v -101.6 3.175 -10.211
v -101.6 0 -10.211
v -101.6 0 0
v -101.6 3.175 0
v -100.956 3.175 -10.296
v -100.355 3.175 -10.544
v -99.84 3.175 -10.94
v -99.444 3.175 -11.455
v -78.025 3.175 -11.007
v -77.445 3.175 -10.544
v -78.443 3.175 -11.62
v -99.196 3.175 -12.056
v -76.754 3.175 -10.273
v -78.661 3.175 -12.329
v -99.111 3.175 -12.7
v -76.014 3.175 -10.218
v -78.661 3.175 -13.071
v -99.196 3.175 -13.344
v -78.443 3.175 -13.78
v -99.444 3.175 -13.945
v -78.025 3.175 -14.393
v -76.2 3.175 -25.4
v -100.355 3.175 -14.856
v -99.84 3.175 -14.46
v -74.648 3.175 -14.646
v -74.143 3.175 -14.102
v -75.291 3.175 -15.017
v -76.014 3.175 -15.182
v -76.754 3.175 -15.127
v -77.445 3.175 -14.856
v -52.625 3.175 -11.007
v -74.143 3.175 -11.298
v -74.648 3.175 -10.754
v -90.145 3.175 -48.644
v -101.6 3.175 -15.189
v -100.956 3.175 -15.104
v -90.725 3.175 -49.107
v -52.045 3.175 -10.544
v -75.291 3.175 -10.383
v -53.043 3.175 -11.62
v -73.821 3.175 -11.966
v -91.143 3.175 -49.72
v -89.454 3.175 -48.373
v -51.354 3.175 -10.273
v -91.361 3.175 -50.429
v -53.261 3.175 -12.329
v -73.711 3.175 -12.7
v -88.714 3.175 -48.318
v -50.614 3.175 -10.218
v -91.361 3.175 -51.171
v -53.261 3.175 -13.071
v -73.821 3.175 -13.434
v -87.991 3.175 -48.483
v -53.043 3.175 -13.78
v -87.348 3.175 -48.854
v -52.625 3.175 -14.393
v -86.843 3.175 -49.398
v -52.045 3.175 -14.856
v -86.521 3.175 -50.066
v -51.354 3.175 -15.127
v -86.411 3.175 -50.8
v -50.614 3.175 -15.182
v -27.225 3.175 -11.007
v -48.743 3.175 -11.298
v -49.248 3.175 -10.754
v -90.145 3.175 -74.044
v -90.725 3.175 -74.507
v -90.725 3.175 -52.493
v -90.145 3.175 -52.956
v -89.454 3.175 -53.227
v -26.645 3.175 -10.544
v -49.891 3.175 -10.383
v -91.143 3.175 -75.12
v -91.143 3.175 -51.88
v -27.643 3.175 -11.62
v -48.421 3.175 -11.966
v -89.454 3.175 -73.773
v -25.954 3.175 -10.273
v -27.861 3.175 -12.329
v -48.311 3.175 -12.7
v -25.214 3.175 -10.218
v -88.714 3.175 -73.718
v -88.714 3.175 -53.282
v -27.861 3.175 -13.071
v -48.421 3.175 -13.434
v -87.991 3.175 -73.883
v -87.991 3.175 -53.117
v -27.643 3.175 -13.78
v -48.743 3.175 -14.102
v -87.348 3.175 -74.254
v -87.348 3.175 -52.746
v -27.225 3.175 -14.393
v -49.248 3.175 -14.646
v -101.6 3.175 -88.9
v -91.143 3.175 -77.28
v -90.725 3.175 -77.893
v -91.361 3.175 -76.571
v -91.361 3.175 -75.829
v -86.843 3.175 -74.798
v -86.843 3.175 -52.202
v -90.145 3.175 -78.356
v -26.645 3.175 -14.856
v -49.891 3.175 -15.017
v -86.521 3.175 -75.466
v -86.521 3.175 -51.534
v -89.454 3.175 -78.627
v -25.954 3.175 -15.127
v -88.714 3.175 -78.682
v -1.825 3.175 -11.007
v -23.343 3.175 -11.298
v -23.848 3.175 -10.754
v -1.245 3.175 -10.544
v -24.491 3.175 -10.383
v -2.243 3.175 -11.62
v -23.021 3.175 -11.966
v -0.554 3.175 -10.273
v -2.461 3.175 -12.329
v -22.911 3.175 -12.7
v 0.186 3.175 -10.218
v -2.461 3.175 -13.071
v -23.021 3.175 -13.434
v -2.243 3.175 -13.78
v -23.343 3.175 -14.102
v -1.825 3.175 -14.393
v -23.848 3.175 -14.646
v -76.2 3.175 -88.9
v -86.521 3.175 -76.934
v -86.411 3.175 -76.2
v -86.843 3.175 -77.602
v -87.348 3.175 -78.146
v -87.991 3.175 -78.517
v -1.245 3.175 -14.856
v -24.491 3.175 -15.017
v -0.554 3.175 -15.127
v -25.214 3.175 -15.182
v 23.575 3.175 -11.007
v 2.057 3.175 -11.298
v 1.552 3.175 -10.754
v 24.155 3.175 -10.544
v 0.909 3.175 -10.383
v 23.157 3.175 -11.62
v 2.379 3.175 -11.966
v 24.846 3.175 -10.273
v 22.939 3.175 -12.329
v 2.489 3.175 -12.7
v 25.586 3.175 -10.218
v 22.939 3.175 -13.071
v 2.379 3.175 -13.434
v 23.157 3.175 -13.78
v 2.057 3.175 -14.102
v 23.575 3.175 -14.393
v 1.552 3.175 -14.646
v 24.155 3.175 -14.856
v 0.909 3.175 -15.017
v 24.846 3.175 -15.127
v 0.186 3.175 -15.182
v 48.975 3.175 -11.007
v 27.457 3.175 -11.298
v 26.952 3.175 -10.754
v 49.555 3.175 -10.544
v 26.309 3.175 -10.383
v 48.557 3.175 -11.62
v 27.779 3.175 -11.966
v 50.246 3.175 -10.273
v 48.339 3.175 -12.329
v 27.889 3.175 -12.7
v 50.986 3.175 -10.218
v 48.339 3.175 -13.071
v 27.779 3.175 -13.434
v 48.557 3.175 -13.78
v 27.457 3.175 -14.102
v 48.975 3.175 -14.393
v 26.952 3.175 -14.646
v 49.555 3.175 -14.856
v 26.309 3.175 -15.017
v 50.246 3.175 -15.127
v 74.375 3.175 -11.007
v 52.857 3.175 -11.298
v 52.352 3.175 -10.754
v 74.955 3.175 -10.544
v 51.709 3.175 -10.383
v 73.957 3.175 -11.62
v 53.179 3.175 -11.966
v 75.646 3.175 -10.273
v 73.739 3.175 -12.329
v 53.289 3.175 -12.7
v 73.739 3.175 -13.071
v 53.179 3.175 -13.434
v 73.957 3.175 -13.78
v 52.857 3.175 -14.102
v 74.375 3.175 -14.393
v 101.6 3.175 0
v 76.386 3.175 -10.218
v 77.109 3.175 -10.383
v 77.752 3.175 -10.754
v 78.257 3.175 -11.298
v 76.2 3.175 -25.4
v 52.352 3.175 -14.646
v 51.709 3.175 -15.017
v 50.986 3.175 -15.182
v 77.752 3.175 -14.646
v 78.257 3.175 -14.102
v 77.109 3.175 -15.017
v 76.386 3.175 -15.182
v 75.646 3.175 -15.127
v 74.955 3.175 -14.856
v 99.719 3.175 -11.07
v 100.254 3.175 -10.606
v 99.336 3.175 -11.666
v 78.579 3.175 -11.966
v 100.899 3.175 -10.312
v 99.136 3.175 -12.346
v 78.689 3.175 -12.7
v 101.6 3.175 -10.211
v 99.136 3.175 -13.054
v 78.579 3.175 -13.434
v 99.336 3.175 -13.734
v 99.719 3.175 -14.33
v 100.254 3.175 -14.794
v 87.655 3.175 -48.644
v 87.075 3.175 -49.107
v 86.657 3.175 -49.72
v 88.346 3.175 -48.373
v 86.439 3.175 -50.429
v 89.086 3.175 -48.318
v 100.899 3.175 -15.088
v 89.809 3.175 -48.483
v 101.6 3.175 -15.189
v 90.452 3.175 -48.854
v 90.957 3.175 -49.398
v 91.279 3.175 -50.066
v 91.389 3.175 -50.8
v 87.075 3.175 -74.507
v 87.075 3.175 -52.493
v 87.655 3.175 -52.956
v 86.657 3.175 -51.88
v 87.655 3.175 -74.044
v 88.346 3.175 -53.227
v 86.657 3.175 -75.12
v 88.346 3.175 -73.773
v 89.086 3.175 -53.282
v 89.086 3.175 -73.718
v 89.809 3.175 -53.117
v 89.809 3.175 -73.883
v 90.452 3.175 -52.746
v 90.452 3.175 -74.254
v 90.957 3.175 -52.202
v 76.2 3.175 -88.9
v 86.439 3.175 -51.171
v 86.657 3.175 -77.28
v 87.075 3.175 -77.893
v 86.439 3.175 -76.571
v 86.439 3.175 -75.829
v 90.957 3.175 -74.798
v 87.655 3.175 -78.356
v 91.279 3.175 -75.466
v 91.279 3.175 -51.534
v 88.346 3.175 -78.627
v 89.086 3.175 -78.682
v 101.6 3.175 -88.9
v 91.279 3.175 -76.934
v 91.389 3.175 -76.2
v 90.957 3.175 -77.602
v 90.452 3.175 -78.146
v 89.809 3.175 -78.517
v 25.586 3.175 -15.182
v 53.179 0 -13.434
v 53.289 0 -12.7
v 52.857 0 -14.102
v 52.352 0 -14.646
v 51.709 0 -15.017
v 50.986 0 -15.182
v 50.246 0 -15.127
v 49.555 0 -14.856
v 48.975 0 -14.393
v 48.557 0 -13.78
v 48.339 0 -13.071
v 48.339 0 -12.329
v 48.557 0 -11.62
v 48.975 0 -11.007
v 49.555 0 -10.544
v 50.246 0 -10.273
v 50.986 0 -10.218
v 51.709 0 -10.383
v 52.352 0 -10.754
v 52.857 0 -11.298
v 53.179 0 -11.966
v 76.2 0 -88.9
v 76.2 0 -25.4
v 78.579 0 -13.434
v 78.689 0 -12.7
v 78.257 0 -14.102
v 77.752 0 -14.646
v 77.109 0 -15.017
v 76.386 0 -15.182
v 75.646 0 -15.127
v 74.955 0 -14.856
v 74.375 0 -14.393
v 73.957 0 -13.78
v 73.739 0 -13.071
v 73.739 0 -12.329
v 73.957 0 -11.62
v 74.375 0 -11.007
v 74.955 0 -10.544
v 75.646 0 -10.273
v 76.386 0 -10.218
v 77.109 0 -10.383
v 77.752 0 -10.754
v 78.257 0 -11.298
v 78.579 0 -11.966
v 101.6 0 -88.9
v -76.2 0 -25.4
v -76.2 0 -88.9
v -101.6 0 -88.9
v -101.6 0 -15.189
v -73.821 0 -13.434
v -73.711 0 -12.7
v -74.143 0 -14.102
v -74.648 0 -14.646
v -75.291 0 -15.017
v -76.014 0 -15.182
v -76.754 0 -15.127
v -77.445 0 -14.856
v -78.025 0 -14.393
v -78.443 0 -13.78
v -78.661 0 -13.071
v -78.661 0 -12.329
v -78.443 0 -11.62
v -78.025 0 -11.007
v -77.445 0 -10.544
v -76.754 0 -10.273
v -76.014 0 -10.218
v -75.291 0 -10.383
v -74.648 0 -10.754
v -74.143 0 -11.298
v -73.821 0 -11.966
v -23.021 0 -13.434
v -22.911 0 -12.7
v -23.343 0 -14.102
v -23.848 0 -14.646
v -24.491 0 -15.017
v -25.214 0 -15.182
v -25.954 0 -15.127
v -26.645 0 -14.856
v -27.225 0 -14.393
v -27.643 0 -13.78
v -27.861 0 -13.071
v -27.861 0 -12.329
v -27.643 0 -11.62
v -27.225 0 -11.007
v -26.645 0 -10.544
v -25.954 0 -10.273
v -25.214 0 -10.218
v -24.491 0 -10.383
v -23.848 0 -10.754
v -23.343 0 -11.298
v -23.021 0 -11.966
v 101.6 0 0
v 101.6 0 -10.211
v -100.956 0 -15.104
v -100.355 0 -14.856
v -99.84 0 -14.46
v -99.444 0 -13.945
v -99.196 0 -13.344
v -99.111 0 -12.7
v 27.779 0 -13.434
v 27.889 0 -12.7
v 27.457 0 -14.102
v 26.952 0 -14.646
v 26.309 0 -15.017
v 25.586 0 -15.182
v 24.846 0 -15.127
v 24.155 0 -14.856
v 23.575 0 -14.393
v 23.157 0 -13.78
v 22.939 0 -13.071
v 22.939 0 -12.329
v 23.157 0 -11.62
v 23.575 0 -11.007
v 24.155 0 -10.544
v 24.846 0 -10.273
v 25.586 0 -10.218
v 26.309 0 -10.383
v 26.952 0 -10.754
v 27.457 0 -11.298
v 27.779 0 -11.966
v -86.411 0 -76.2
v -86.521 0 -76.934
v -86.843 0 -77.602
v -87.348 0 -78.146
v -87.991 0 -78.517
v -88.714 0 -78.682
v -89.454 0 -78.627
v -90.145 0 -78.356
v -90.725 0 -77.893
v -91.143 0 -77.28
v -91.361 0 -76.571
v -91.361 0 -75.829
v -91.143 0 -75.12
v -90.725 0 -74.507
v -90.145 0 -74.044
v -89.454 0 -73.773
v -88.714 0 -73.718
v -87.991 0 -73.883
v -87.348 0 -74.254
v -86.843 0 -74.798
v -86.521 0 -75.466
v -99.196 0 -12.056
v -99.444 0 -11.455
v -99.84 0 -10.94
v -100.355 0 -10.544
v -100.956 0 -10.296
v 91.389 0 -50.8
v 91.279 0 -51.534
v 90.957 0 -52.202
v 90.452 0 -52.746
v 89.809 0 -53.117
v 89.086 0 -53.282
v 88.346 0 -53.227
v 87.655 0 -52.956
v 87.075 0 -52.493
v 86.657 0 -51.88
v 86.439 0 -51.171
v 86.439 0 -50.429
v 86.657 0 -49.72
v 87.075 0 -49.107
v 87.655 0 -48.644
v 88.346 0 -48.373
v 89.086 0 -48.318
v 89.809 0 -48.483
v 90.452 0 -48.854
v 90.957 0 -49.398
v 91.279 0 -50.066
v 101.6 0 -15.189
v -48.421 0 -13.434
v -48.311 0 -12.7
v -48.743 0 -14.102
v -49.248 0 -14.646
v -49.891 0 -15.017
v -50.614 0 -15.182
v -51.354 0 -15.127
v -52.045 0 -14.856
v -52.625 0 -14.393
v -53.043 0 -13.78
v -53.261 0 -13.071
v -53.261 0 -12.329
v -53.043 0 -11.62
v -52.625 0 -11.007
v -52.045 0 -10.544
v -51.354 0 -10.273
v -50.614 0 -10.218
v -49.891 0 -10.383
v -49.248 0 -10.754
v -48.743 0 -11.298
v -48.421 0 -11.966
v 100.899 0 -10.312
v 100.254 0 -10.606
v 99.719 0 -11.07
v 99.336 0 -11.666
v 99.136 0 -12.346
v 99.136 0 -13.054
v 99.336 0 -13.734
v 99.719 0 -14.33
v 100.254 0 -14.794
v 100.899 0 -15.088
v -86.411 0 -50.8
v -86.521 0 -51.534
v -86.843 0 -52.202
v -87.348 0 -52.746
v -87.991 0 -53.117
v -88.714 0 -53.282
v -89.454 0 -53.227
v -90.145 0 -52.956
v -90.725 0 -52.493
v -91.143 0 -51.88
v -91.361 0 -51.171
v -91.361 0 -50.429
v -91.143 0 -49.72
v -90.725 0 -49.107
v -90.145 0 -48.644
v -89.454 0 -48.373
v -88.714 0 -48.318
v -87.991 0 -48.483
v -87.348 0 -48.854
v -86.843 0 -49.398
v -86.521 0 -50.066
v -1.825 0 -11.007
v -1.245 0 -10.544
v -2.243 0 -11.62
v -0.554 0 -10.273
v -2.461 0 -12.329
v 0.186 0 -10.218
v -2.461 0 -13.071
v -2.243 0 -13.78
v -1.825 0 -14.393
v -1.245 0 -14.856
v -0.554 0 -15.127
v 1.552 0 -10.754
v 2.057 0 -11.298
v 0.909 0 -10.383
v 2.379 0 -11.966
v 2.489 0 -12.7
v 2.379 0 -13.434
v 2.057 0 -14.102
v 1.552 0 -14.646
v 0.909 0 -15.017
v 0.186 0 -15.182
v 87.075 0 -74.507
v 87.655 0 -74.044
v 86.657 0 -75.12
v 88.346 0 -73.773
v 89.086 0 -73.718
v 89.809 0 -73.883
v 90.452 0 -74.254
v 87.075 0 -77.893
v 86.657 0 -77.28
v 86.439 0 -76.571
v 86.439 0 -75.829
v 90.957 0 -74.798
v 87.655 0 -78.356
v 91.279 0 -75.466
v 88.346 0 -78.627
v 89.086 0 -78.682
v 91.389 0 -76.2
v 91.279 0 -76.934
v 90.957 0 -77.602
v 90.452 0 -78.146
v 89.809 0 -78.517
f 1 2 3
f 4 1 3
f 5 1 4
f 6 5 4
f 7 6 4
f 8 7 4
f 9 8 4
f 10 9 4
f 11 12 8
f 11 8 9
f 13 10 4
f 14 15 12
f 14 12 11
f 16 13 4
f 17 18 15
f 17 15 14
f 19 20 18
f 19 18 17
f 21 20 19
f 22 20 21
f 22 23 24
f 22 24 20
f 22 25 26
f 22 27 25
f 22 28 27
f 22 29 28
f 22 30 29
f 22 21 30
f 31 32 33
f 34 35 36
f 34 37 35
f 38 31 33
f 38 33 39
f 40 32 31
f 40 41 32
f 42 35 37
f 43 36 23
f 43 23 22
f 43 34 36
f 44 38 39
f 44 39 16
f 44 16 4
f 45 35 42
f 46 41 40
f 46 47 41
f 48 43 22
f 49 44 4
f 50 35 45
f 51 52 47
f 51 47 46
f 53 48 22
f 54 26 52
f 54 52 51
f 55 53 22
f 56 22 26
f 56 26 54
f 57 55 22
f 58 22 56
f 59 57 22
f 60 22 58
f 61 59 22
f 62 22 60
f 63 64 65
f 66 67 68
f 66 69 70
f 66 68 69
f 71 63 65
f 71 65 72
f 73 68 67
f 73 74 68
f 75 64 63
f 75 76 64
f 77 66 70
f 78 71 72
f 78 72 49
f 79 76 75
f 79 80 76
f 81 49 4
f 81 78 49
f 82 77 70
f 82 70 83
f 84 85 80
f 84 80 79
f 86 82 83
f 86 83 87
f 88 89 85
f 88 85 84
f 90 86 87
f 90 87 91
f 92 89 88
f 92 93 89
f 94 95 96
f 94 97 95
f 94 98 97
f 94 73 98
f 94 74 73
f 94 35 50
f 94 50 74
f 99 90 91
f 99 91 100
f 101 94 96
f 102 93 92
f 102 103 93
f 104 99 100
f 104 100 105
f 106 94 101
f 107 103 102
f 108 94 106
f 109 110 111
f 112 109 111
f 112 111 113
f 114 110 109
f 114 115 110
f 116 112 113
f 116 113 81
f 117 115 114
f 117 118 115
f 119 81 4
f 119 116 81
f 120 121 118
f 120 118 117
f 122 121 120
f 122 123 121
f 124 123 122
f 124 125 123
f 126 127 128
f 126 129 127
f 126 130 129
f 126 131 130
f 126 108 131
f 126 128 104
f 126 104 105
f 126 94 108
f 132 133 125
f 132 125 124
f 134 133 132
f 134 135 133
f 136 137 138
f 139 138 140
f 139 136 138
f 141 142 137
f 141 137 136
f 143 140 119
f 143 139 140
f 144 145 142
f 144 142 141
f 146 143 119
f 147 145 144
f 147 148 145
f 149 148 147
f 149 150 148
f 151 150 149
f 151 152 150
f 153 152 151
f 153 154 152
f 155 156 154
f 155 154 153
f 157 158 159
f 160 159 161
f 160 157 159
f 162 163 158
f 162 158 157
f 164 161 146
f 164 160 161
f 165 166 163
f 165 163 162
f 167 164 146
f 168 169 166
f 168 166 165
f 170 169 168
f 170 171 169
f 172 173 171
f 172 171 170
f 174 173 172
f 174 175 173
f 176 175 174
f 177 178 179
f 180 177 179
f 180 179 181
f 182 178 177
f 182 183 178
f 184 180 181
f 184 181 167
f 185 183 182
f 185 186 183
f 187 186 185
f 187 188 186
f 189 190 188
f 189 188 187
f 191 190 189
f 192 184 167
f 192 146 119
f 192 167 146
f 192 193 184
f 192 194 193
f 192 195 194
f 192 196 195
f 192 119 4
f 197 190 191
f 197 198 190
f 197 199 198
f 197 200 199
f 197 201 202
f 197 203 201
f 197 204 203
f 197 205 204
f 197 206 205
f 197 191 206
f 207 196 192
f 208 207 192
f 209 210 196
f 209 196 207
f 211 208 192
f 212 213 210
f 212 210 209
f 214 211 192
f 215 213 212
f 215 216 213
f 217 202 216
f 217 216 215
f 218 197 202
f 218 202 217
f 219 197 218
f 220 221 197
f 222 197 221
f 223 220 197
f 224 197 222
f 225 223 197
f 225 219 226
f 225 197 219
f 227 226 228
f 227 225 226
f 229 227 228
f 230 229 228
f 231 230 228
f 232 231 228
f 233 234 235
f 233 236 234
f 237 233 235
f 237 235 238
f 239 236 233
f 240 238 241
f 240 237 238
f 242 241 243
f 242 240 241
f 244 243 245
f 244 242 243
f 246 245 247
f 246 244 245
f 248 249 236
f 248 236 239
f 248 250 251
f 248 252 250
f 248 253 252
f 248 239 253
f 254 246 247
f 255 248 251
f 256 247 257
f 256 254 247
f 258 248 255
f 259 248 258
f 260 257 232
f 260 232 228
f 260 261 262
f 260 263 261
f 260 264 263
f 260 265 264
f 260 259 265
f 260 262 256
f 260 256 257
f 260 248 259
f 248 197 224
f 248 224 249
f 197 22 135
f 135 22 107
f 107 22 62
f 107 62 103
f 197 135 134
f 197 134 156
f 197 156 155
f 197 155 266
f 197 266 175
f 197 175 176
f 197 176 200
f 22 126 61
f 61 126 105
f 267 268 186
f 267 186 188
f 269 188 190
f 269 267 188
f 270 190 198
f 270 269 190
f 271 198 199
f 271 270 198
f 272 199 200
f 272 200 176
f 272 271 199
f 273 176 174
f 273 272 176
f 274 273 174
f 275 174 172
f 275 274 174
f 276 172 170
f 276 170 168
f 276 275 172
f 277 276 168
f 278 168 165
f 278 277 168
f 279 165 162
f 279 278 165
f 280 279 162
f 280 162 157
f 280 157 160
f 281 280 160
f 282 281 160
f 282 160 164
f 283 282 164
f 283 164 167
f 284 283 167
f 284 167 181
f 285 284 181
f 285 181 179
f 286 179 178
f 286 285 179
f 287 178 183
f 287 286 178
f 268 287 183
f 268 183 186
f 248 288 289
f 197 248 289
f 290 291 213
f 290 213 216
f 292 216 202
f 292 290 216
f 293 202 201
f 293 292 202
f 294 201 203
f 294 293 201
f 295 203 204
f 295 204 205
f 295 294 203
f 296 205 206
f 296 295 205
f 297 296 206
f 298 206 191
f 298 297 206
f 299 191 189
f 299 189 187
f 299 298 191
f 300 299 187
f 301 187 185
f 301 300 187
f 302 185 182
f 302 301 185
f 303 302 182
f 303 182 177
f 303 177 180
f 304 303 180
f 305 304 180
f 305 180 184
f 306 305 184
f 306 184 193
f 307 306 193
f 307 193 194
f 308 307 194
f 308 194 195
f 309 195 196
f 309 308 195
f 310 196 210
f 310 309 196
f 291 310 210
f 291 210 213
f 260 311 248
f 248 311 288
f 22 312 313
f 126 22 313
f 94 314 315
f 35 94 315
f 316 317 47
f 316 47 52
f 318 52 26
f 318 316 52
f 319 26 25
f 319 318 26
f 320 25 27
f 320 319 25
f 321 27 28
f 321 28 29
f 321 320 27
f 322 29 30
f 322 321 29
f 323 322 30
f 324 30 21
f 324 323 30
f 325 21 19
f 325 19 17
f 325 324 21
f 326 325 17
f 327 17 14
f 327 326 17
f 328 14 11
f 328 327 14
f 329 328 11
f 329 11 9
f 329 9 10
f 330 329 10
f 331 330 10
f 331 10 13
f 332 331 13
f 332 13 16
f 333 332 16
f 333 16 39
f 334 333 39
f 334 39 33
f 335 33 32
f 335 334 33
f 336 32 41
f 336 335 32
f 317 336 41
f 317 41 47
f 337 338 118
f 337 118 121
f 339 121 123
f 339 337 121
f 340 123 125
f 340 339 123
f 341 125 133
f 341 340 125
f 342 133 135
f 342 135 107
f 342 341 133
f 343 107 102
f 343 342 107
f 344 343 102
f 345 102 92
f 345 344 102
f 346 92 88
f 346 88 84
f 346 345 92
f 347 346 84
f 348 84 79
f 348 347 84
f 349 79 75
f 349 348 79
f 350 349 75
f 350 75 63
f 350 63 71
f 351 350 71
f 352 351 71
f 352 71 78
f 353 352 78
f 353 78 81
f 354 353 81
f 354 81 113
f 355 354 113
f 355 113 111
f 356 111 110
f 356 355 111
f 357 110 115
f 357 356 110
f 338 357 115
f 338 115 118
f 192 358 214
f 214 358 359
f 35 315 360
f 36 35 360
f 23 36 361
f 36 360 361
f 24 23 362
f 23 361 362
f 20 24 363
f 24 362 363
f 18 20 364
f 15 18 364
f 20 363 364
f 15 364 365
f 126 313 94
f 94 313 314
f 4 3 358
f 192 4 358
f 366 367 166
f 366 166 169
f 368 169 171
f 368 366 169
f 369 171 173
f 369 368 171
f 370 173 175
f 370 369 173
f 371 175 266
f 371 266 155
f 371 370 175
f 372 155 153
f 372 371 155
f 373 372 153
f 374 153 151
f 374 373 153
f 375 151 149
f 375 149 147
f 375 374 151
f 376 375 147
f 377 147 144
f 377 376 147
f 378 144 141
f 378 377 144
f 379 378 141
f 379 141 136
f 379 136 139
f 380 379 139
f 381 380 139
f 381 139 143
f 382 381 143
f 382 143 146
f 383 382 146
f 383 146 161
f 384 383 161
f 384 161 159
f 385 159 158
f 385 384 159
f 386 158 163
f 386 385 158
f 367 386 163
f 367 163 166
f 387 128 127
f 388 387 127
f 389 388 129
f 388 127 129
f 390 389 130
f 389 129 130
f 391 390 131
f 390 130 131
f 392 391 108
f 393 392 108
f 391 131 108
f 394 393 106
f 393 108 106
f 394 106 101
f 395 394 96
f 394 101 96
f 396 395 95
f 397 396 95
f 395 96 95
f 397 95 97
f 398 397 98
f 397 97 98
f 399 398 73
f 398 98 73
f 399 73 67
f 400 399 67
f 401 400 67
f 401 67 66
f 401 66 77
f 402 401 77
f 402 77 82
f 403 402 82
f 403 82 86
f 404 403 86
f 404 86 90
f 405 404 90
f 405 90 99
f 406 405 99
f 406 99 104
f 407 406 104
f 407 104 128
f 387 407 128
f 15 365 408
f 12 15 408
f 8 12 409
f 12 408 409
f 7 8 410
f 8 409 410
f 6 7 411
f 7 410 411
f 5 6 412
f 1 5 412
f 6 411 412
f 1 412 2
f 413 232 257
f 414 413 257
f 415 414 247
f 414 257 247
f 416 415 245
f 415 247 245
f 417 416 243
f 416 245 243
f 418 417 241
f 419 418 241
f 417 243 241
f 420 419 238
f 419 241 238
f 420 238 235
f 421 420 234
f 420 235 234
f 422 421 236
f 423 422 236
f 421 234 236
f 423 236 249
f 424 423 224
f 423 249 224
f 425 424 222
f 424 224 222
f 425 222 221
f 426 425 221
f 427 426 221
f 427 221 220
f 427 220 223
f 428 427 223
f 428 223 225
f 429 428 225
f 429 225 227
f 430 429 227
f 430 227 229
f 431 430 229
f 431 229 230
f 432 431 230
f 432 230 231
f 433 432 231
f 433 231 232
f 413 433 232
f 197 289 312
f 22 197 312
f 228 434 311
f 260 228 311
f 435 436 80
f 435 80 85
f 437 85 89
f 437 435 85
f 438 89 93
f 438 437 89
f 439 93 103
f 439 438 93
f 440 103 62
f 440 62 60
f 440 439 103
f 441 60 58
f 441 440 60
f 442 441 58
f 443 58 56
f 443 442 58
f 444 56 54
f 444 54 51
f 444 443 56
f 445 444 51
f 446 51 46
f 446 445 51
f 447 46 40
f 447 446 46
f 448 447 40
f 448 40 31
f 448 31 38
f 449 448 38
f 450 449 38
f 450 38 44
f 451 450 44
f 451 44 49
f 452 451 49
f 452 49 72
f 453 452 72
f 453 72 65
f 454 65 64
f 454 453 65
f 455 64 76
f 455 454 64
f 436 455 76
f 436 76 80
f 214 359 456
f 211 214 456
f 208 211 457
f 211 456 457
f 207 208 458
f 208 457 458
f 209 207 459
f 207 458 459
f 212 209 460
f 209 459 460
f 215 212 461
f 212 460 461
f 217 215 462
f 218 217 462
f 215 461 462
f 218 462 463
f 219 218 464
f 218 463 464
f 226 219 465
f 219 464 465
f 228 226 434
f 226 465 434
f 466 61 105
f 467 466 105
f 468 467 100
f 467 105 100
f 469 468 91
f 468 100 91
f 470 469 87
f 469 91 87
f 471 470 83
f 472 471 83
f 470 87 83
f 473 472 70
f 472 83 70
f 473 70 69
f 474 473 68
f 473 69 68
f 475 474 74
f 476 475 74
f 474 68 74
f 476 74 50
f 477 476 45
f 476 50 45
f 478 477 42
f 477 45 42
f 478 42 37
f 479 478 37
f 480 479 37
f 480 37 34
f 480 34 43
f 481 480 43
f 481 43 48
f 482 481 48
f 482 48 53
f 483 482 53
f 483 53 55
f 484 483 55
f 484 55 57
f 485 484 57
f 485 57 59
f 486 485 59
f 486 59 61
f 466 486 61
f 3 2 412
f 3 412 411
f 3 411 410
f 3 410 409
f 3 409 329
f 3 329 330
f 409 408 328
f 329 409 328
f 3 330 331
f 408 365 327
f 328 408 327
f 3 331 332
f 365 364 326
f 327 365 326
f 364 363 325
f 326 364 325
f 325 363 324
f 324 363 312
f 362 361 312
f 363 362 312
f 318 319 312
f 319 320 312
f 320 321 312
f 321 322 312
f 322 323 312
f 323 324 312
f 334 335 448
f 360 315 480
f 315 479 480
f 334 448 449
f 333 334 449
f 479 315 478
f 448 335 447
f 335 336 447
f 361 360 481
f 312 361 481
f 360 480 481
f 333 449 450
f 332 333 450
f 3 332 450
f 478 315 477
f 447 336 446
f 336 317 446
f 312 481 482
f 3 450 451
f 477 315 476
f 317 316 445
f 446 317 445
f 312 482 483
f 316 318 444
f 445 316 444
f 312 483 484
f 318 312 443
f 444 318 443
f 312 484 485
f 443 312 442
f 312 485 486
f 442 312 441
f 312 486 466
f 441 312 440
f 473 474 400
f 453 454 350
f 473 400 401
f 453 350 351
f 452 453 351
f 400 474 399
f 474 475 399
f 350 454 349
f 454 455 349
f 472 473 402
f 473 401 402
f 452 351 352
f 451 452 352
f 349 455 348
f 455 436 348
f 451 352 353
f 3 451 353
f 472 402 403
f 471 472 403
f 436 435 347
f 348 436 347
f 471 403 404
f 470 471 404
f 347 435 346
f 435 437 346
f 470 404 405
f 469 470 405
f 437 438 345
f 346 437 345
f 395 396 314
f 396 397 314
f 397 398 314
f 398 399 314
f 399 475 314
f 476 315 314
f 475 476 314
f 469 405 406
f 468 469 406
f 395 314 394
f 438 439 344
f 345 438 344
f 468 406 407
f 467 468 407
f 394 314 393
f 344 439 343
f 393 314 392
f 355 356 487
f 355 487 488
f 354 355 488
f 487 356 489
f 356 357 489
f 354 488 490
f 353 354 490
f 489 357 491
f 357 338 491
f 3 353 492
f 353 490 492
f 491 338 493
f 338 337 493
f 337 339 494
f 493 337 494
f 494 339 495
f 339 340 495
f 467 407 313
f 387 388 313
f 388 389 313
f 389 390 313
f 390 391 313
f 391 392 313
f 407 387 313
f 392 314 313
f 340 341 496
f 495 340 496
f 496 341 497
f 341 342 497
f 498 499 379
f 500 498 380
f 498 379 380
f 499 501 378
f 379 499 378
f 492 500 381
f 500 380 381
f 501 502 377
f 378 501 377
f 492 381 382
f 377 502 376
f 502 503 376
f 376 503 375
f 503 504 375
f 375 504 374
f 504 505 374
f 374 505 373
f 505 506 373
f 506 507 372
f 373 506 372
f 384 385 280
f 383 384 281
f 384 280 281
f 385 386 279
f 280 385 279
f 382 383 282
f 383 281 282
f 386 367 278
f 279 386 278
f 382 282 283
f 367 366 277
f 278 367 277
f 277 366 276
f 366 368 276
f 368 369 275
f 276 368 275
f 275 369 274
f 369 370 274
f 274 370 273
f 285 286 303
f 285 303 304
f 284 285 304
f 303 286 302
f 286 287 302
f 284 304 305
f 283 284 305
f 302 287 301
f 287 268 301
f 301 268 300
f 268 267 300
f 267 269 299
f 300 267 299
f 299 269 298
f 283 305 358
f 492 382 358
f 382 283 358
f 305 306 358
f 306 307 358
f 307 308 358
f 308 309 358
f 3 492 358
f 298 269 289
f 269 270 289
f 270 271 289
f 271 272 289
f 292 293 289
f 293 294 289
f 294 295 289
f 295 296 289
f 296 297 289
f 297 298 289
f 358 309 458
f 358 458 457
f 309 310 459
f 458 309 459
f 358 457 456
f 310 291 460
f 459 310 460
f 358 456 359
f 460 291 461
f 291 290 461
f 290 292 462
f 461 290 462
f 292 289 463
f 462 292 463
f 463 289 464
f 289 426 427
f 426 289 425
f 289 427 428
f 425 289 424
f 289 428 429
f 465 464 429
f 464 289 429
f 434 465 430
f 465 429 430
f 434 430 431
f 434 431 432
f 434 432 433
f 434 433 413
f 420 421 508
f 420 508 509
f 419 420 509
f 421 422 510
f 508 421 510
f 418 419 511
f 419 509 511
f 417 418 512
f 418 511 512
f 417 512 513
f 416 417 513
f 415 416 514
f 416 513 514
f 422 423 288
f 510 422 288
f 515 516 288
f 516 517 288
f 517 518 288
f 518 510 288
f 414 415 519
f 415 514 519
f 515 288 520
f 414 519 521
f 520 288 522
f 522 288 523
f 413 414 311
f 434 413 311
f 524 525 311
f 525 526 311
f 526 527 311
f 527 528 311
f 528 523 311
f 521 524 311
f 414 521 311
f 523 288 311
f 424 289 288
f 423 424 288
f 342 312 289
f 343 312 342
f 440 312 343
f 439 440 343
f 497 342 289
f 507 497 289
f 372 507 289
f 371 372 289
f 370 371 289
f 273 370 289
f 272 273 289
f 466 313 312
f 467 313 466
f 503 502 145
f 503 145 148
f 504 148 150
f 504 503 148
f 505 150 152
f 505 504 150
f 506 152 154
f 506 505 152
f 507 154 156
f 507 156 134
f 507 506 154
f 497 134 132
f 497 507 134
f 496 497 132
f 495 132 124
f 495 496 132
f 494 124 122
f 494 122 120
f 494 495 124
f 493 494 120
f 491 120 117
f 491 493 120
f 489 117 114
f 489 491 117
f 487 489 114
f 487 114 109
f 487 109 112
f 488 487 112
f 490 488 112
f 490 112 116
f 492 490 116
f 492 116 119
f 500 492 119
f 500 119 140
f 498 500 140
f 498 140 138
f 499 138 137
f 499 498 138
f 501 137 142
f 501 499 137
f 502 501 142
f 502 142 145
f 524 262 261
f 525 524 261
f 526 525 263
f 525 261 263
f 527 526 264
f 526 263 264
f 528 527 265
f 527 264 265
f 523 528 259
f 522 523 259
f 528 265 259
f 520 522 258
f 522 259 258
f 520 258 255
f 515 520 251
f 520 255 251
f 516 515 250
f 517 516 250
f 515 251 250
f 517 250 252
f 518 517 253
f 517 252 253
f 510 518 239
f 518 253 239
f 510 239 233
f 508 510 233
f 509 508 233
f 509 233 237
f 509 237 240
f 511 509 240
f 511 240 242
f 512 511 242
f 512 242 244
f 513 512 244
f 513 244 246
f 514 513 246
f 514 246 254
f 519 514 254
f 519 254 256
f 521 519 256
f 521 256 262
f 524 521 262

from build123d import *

# Parameters (mm, degrees)
SKETCH1_R           = 2.4892
BOSS_EXTRUDE1_DEPTH = 3.175
SKETCH2_R           = 2.4892
CUT_EXTRUDE1_DEPTH  = 4.175


with BuildPart() as part:
    # Sketch1 → Boss-Extrude1 (new body)
    with BuildSketch(Plane(origin=(0, 0, 0), x_dir=(1, 0, 0), z_dir=(0, 1, 0))):
        with BuildLine():
            Line((-101.6, 10.2108), (-101.6, 0))
            Line((-101.6, 0), (101.6, 0))
            Line((101.6, 0), (101.6, 10.2108))
            ThreePointArc((101.6, 10.2108), (99.1108, 12.7), (101.6, 15.1892))
            Line((101.6, 15.1892), (101.6, 88.9))
            Line((101.6, 88.9), (76.2, 88.9))
            Line((76.2, 88.9), (76.2, 25.4))
            Line((76.2, 25.4), (-76.2, 25.4))
            Line((-76.2, 25.4), (-76.2, 88.9))
            Line((-76.2, 88.9), (-101.6, 88.9))
            Line((-101.6, 88.9), (-101.6, 15.1892))
            ThreePointArc((-101.6, 15.1892), (-99.8398698, 14.4601302), (-99.1108, 12.7))
            ThreePointArc((-99.1108, 12.7), (-99.8398698, 10.9398698), (-101.6, 10.2108))
        make_face()
        with Locations((-76.2, 12.7)):
            Circle(SKETCH1_R, mode=Mode.SUBTRACT)
        with Locations((-50.8, 12.7)):
            Circle(SKETCH1_R, mode=Mode.SUBTRACT)
        with Locations((-25.4, 12.7)):
            Circle(SKETCH1_R, mode=Mode.SUBTRACT)
        with Locations((0, 12.7)):
            Circle(SKETCH1_R, mode=Mode.SUBTRACT)
        with Locations((25.4, 12.7)):
            Circle(SKETCH1_R, mode=Mode.SUBTRACT)
        with Locations((50.8, 12.7)):
            Circle(SKETCH1_R, mode=Mode.SUBTRACT)
        with Locations((76.2, 12.7)):
            Circle(SKETCH1_R, mode=Mode.SUBTRACT)
    extrude(amount=BOSS_EXTRUDE1_DEPTH)

    # Sketch2 → Cut-Extrude1 (cut, through all)
    with BuildSketch(Plane(origin=(0, 3.175, 0), x_dir=(1, 0, 0), z_dir=(0, 1, 0))):
        with Locations((-88.9, 50.8)):
            Circle(SKETCH2_R)
        with Locations((-88.9, 76.2)):
            Circle(SKETCH2_R)
        with Locations((88.9, 76.2)):
            Circle(SKETCH2_R)
        with Locations((88.9, 50.8)):
            Circle(SKETCH2_R)
    extrude(amount=-CUT_EXTRUDE1_DEPTH, mode=Mode.SUBTRACT)


solid = part.part
